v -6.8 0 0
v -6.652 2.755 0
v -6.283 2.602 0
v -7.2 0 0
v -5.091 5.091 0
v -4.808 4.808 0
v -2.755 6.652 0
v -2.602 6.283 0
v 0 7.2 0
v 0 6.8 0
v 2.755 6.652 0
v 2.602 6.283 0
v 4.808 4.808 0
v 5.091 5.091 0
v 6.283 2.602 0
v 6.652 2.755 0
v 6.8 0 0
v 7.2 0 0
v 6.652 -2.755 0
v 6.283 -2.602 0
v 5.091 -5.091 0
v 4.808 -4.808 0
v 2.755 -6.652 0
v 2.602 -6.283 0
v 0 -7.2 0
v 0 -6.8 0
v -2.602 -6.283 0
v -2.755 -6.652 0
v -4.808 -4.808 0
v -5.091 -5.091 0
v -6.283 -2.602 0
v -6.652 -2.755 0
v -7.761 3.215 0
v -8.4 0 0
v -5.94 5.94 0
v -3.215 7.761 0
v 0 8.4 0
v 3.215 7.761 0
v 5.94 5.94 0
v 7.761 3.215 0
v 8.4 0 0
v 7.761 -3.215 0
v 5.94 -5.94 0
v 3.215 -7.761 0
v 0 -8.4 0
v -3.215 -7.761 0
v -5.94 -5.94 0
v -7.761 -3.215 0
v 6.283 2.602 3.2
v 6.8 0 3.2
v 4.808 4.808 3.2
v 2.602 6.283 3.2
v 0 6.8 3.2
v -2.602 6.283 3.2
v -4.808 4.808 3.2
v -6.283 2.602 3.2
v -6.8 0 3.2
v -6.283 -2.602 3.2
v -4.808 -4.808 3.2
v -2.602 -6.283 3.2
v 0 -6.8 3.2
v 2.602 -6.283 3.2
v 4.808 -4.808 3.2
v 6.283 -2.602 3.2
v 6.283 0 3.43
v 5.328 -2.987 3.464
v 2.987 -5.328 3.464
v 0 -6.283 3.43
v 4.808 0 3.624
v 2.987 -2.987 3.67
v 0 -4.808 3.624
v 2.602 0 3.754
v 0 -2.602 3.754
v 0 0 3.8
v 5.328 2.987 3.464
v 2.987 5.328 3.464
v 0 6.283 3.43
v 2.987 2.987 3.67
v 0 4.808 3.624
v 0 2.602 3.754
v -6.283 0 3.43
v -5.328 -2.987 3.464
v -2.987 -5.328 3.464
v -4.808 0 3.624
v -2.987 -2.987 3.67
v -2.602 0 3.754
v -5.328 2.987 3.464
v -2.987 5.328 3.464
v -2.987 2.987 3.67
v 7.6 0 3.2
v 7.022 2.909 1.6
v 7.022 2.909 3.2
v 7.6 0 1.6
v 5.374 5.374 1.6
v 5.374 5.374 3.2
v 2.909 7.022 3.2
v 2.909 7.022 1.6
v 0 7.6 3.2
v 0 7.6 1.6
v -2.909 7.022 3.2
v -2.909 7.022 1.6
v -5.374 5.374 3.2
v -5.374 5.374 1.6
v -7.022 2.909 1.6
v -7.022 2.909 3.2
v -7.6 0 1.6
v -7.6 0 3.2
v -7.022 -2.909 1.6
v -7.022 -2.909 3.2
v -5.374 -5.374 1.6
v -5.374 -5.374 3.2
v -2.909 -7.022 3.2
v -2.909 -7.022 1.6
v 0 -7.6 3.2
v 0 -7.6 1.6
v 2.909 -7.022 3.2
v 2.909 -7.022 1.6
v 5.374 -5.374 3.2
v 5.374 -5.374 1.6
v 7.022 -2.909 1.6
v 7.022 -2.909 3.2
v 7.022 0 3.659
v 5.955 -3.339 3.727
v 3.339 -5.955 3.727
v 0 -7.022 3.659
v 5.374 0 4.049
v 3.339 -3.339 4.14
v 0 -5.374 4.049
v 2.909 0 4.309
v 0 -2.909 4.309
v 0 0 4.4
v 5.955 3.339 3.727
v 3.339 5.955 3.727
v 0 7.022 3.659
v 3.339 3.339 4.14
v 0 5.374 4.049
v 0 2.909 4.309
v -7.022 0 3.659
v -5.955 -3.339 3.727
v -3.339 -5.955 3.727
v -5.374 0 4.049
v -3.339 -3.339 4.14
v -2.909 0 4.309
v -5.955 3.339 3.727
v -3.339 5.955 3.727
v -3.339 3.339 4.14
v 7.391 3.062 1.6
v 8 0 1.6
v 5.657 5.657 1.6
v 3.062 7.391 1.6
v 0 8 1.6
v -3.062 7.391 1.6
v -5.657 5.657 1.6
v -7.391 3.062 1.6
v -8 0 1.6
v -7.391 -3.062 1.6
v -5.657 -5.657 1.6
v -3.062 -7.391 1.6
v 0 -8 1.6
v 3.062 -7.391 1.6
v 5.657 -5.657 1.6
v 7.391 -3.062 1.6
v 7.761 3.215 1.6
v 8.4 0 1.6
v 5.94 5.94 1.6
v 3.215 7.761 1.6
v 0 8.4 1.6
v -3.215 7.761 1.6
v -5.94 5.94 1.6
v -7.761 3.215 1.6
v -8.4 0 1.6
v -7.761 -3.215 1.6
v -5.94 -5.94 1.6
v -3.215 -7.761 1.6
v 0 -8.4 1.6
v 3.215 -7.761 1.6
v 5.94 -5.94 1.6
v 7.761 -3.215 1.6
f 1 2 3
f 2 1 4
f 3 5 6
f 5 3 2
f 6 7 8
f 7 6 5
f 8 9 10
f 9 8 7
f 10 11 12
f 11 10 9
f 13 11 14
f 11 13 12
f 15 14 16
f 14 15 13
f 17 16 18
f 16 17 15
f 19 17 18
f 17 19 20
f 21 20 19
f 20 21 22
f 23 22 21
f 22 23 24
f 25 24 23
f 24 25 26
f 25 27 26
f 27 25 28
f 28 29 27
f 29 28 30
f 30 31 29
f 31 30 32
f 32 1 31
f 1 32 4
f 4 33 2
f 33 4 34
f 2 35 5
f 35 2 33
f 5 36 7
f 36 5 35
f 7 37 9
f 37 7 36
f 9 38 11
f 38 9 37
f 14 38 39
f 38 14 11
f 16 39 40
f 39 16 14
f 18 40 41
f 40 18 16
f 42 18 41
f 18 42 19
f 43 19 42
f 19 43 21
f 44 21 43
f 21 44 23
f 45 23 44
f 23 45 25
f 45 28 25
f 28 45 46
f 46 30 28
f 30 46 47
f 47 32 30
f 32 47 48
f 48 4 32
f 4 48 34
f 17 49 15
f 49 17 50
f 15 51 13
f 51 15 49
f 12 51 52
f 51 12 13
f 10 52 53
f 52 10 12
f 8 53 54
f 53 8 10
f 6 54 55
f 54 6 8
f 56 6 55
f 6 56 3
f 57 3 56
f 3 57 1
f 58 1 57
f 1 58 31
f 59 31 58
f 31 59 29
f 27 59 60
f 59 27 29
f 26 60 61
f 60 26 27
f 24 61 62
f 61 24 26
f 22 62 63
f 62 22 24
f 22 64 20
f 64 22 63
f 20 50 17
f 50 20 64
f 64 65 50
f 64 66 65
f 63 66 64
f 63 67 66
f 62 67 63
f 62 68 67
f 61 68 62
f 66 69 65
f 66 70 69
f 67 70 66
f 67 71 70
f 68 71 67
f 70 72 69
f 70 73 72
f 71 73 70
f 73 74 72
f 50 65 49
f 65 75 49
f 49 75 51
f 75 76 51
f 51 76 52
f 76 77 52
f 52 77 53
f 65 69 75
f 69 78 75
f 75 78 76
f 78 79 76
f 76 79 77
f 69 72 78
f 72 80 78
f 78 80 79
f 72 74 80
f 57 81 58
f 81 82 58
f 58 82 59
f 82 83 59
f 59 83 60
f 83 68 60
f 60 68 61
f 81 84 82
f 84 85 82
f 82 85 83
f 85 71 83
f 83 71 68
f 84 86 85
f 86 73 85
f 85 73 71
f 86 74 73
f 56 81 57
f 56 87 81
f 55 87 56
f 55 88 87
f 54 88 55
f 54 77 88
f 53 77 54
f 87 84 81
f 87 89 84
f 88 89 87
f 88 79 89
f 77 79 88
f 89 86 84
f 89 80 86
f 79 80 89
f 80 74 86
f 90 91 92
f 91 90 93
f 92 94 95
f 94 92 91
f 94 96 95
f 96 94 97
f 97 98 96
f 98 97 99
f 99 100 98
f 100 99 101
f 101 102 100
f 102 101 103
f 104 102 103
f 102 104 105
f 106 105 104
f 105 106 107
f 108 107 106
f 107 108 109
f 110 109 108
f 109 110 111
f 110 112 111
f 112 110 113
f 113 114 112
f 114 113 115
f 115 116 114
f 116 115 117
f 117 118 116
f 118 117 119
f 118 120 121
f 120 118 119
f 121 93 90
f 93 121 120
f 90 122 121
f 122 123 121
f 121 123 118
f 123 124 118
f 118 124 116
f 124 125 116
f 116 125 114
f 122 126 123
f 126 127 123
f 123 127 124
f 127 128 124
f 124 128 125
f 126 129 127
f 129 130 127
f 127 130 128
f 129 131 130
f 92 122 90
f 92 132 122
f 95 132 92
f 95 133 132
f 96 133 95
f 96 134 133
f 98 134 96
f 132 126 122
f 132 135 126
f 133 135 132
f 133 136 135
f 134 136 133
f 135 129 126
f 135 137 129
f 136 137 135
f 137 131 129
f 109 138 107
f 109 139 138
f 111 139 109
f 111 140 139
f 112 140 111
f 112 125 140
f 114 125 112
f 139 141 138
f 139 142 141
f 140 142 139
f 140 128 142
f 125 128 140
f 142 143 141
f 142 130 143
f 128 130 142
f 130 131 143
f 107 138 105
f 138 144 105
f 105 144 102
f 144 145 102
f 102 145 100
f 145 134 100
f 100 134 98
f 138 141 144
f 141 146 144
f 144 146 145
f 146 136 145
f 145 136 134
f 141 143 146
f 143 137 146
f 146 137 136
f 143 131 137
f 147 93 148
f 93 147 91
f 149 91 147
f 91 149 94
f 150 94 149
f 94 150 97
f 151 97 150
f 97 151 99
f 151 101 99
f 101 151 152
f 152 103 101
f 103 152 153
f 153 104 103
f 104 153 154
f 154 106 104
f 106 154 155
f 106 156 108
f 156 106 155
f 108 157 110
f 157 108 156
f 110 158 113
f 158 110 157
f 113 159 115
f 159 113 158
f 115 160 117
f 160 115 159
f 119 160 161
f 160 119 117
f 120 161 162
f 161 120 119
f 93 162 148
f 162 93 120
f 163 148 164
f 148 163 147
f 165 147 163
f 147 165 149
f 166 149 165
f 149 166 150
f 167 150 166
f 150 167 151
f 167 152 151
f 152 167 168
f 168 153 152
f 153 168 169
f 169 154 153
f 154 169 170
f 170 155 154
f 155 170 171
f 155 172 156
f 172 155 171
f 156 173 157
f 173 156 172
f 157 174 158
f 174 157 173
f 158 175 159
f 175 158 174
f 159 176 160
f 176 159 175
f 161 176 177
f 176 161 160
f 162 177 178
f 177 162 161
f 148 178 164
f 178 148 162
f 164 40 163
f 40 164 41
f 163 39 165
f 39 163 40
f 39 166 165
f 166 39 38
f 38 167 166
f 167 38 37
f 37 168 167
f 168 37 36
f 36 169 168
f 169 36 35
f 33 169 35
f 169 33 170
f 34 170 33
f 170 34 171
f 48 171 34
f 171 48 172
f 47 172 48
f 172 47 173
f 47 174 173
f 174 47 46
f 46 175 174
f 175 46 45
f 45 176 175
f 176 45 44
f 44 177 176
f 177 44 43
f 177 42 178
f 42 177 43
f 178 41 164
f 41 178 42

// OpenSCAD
// file: ../p/1-8sphe.scad
use <../lib.scad>
function ldraw_lib__1_8sphe() = [
// 0 Sphere 0.125
// 0 Name: 1-8sphe.dat
// 0 Author: James Jessiman
// 0 !LDRAW_ORG Primitive UPDATE 2012-03
// 0 !LICENSE Licensed under CC BY 2.0 and CC BY 4.0 : see CAreadme.txt
// 
// 0 BFC CERTIFY CCW
  [0,"BFC","CERTIFY"],
  [0,"BFC","CCW"],
// 
// 0 !HISTORY 2000-08-01 {Axel Poque} fixes to resolve L3P error messages.
// 0 !HISTORY 2000-08-01 {Manfred Moolhuysen} fixes to resolve L3P error messages.
// 0 !HISTORY 2000-09-30 [PTadmin] Official Update 2000-02
// 0 !HISTORY 2002-03-28 [hafhead] Made BFC compliant
// 0 !HISTORY 2002-04-25 [PTadmin] Official Update 2002-02
// 0 !HISTORY 2007-06-22 [PTadmin] Header formatted for Contributor Agreement
// 0 !HISTORY 2008-07-01 [PTadmin] Official Update 2008-01
// 0 !HISTORY 2010-09-12 [MagFors] Changed winding, removed duplicated cond-line, optimized filesize
// 0 !HISTORY 2010-12-31 [PTadmin] Official Update 2010-03
// 0 !HISTORY 2012-07-01 [tcobbs] Replaced with geometry from LDView
// 0 !HISTORY 2012-12-28 [PTadmin] Official Update 2012-03
// 
// 
// 3 16 1 0 0 0.9239 0.3827 0 0.9239 0 0.3827
  [3,16,1,0,0,0.9239,0.3827,0,0.9239,0,0.3827],
// 3 16 0.9239 0.3827 0 0.7836 0.4393 0.4393 0.9239 0 0.3827
  [3,16,0.9239,0.3827,0,0.7836,0.4393,0.4393,0.9239,0,0.3827],
// 3 16 0.9239 0 0.3827 0.7836 0.4393 0.4393 0.7071 0 0.7071
  [3,16,0.9239,0,0.3827,0.7836,0.4393,0.4393,0.7071,0,0.7071],
// 3 16 0.7836 0.4393 0.4393 0.4393 0.4393 0.7836 0.7071 0 0.7071
  [3,16,0.7836,0.4393,0.4393,0.4393,0.4393,0.7836,0.7071,0,0.7071],
// 3 16 0.7071 0 0.7071 0.4393 0.4393 0.7836 0.3827 0 0.9239
  [3,16,0.7071,0,0.7071,0.4393,0.4393,0.7836,0.3827,0,0.9239],
// 3 16 0.4393 0.4393 0.7836 0 0.3827 0.9239 0.3827 0 0.9239
  [3,16,0.4393,0.4393,0.7836,0,0.3827,0.9239,0.3827,0,0.9239],
// 3 16 0.3827 0 0.9239 0 0.3827 0.9239 0 0 1
  [3,16,0.3827,0,0.9239,0,0.3827,0.9239,0,0,1],
// 3 16 0.9239 0.3827 0 0.7071 0.7071 0 0.7836 0.4393 0.4393
  [3,16,0.9239,0.3827,0,0.7071,0.7071,0,0.7836,0.4393,0.4393],
// 3 16 0.7071 0.7071 0 0.4393 0.7836 0.4393 0.7836 0.4393 0.4393
  [3,16,0.7071,0.7071,0,0.4393,0.7836,0.4393,0.7836,0.4393,0.4393],
// 3 16 0.7836 0.4393 0.4393 0.4393 0.7836 0.4393 0.4393 0.4393 0.7836
  [3,16,0.7836,0.4393,0.4393,0.4393,0.7836,0.4393,0.4393,0.4393,0.7836],
// 3 16 0.4393 0.7836 0.4393 0 0.7071 0.7071 0.4393 0.4393 0.7836
  [3,16,0.4393,0.7836,0.4393,0,0.7071,0.7071,0.4393,0.4393,0.7836],
// 3 16 0.4393 0.4393 0.7836 0 0.7071 0.7071 0 0.3827 0.9239
  [3,16,0.4393,0.4393,0.7836,0,0.7071,0.7071,0,0.3827,0.9239],
// 3 16 0.7071 0.7071 0 0.3827 0.9239 0 0.4393 0.7836 0.4393
  [3,16,0.7071,0.7071,0,0.3827,0.9239,0,0.4393,0.7836,0.4393],
// 3 16 0.3827 0.9239 0 0 0.9239 0.3827 0.4393 0.7836 0.4393
  [3,16,0.3827,0.9239,0,0,0.9239,0.3827,0.4393,0.7836,0.4393],
// 3 16 0.4393 0.7836 0.4393 0 0.9239 0.3827 0 0.7071 0.7071
  [3,16,0.4393,0.7836,0.4393,0,0.9239,0.3827,0,0.7071,0.7071],
// 3 16 0.3827 0.9239 0 0 1 0 0 0.9239 0.3827
  [3,16,0.3827,0.9239,0,0,1,0,0,0.9239,0.3827],
// 
// 5 24 1 0 0 0.9239 0.3827 0 1 0 -0.1 0.9239 0 0.3827
  [5,24,1,0,0,0.9239,0.3827,0,1,0,-0.1,0.9239,0,0.3827],
// 5 24 0.9239 0.3827 0 0.9239 0 0.3827 1 0 0 0.7836 0.4393 0.4393
  [5,24,0.9239,0.3827,0,0.9239,0,0.3827,1,0,0,0.7836,0.4393,0.4393],
// 5 24 1 0 0 0.9239 0 0.3827 0.9239 0.3827 0 1 -0.1 0
  [5,24,1,0,0,0.9239,0,0.3827,0.9239,0.3827,0,1,-0.1,0],
// 5 24 0.9239 0 0.3827 0.7836 0.4393 0.4393 0.9239 0.3827 0 0.7071 0 0.7071
  [5,24,0.9239,0,0.3827,0.7836,0.4393,0.4393,0.9239,0.3827,0,0.7071,0,0.7071],
// 5 24 0.7836 0.4393 0.4393 0.7071 0 0.7071 0.9239 0 0.3827 0.4393 0.4393 0.7836
  [5,24,0.7836,0.4393,0.4393,0.7071,0,0.7071,0.9239,0,0.3827,0.4393,0.4393,0.7836],
// 5 24 0.9239 0 0.3827 0.7071 0 0.7071 0.7836 0.4393 0.4393 0.9239 -0.1 0.3827
  [5,24,0.9239,0,0.3827,0.7071,0,0.7071,0.7836,0.4393,0.4393,0.9239,-0.1,0.3827],
// 5 24 0.7071 0 0.7071 0.4393 0.4393 0.7836 0.7836 0.4393 0.4393 0.3827 0 0.9239
  [5,24,0.7071,0,0.7071,0.4393,0.4393,0.7836,0.7836,0.4393,0.4393,0.3827,0,0.9239],
// 5 24 0.4393 0.4393 0.7836 0.3827 0 0.9239 0.7071 0 0.7071 0 0.3827 0.9239
  [5,24,0.4393,0.4393,0.7836,0.3827,0,0.9239,0.7071,0,0.7071,0,0.3827,0.9239],
// 5 24 0.7071 0 0.7071 0.3827 0 0.9239 0.4393 0.4393 0.7836 0.7071 -0.1 0.7071
  [5,24,0.7071,0,0.7071,0.3827,0,0.9239,0.4393,0.4393,0.7836,0.7071,-0.1,0.7071],
// 5 24 0.3827 0 0.9239 0 0.3827 0.9239 0.4393 0.4393 0.7836 0 0 1
  [5,24,0.3827,0,0.9239,0,0.3827,0.9239,0.4393,0.4393,0.7836,0,0,1],
// 5 24 0 0.3827 0.9239 0 0 1 0.3827 0 0.9239 -0.1 0.3827 0.9239
  [5,24,0,0.3827,0.9239,0,0,1,0.3827,0,0.9239,-0.1,0.3827,0.9239],
// 5 24 0.3827 0 0.9239 0 0 1 0 0.3827 0.9239 0.3827 -0.1 0.9239
  [5,24,0.3827,0,0.9239,0,0,1,0,0.3827,0.9239,0.3827,-0.1,0.9239],
// 5 24 0.9239 0.3827 0 0.7071 0.7071 0 0.9239 0.3827 -0.1 0.7836 0.4393 0.4393
  [5,24,0.9239,0.3827,0,0.7071,0.7071,0,0.9239,0.3827,-0.1,0.7836,0.4393,0.4393],
// 5 24 0.7071 0.7071 0 0.7836 0.4393 0.4393 0.9239 0.3827 0 0.4393 0.7836 0.4393
  [5,24,0.7071,0.7071,0,0.7836,0.4393,0.4393,0.9239,0.3827,0,0.4393,0.7836,0.4393],
// 5 24 0.9239 0.3827 0 0.7836 0.4393 0.4393 0.7071 0.7071 0 0.9239 0 0.3827
  [5,24,0.9239,0.3827,0,0.7836,0.4393,0.4393,0.7071,0.7071,0,0.9239,0,0.3827],
// 5 24 0.7836 0.4393 0.4393 0.4393 0.7836 0.4393 0.7071 0.7071 0 0.4393 0.4393 0.7836
  [5,24,0.7836,0.4393,0.4393,0.4393,0.7836,0.4393,0.7071,0.7071,0,0.4393,0.4393,0.7836],
// 5 24 0.4393 0.7836 0.4393 0.4393 0.4393 0.7836 0.7836 0.4393 0.4393 0 0.7071 0.7071
  [5,24,0.4393,0.7836,0.4393,0.4393,0.4393,0.7836,0.7836,0.4393,0.4393,0,0.7071,0.7071],
// 5 24 0.7836 0.4393 0.4393 0.4393 0.4393 0.7836 0.4393 0.7836 0.4393 0.7071 0 0.7071
  [5,24,0.7836,0.4393,0.4393,0.4393,0.4393,0.7836,0.4393,0.7836,0.4393,0.7071,0,0.7071],
// 5 24 0.4393 0.4393 0.7836 0 0.7071 0.7071 0.4393 0.7836 0.4393 0 0.3827 0.9239
  [5,24,0.4393,0.4393,0.7836,0,0.7071,0.7071,0.4393,0.7836,0.4393,0,0.3827,0.9239],
// 5 24 0 0.7071 0.7071 0 0.3827 0.9239 0.4393 0.4393 0.7836 -0.1 0.7071 0.7071
  [5,24,0,0.7071,0.7071,0,0.3827,0.9239,0.4393,0.4393,0.7836,-0.1,0.7071,0.7071],
// 5 24 0.4393 0.4393 0.7836 0 0.3827 0.9239 0 0.7071 0.7071 0.3827 0 0.9239
  [5,24,0.4393,0.4393,0.7836,0,0.3827,0.9239,0,0.7071,0.7071,0.3827,0,0.9239],
// 5 24 0.7071 0.7071 0 0.3827 0.9239 0 0.7071 0.7071 -0.1 0.4393 0.7836 0.4393
  [5,24,0.7071,0.7071,0,0.3827,0.9239,0,0.7071,0.7071,-0.1,0.4393,0.7836,0.4393],
// 5 24 0.3827 0.9239 0 0.4393 0.7836 0.4393 0.7071 0.7071 0 0 0.9239 0.3827
  [5,24,0.3827,0.9239,0,0.4393,0.7836,0.4393,0.7071,0.7071,0,0,0.9239,0.3827],
// 5 24 0.7071 0.7071 0 0.4393 0.7836 0.4393 0.3827 0.9239 0 0.7836 0.4393 0.4393
  [5,24,0.7071,0.7071,0,0.4393,0.7836,0.4393,0.3827,0.9239,0,0.7836,0.4393,0.4393],
// 5 24 0.4393 0.7836 0.4393 0 0.9239 0.3827 0.3827 0.9239 0 0 0.7071 0.7071
  [5,24,0.4393,0.7836,0.4393,0,0.9239,0.3827,0.3827,0.9239,0,0,0.7071,0.7071],
// 5 24 0 0.9239 0.3827 0 0.7071 0.7071 0.4393 0.7836 0.4393 -0.1 0.9239 0.3827
  [5,24,0,0.9239,0.3827,0,0.7071,0.7071,0.4393,0.7836,0.4393,-0.1,0.9239,0.3827],
// 5 24 0.4393 0.7836 0.4393 0 0.7071 0.7071 0 0.9239 0.3827 0.4393 0.4393 0.7836
  [5,24,0.4393,0.7836,0.4393,0,0.7071,0.7071,0,0.9239,0.3827,0.4393,0.4393,0.7836],
// 5 24 0.3827 0.9239 0 0 1 0 0.3827 0.9239 -0.1 0 0.9239 0.3827
  [5,24,0.3827,0.9239,0,0,1,0,0.3827,0.9239,-0.1,0,0.9239,0.3827],
// 5 24 0 1 0 0 0.9239 0.3827 0.3827 0.9239 0 -0.1 1 0
  [5,24,0,1,0,0,0.9239,0.3827,0.3827,0.9239,0,-0.1,1,0],
// 5 24 0.3827 0.9239 0 0 0.9239 0.3827 0 1 0 0.4393 0.7836 0.4393
  [5,24,0.3827,0.9239,0,0,0.9239,0.3827,0,1,0,0.4393,0.7836,0.4393],
];
module ldraw_lib__1_8sphe(step=0, col=false, unit=2/5, alt=false, line=0.2, solid=!$preview)
    makepoly(ldraw_lib__1_8sphe(), step=step, col=col, unit=unit, alt=alt, line=line, solid=solid);
ldraw_lib__1_8sphe(line=0.2);
// file: ../p/4-8sphe.scad
use <../lib.scad>
use <1-8sphe.scad>
function ldraw_lib__4_8sphe() = [
// 0 Sphere 0.5
// 0 Name: 4-8sphe.dat
// 0 Author: James Jessiman
// 0 !LDRAW_ORG Primitive UPDATE 2003-02
// 0 !LICENSE Licensed under CC BY 2.0 and CC BY 4.0 : see CAreadme.txt
// 
// 0 BFC CERTIFY CCW
  [0,"BFC","CERTIFY"],
  [0,"BFC","CCW"],
// 
// 0 !HISTORY 2002-08-31 [izanette] Modified with WINDZ for BFC compliance
// 0 !HISTORY 2003-08-01 [PTadmin] Official Update 2003-02
// 0 !HISTORY 2007-06-24 [PTadmin] Header formatted for Contributor Agreement
// 0 !HISTORY 2008-07-01 [PTadmin] Official Update 2008-01
// 
// 
// 1 16 0 0 0 1 0 0 0 1 0 0 0 1 1-8sphe.dat
  [1,16,0,0,0,1,0,0,0,1,0,0,0,1, ldraw_lib__1_8sphe()],
// 1 16 0 0 0 1 0 0 0 1 0 0 0 -1 1-8sphe.dat
  [1,16,0,0,0,1,0,0,0,1,0,0,0,-1, ldraw_lib__1_8sphe()],
// 1 16 0 0 0 -1 0 0 0 1 0 0 0 1 1-8sphe.dat
  [1,16,0,0,0,-1,0,0,0,1,0,0,0,1, ldraw_lib__1_8sphe()],
// 1 16 0 0 0 -1 0 0 0 1 0 0 0 -1 1-8sphe.dat
  [1,16,0,0,0,-1,0,0,0,1,0,0,0,-1, ldraw_lib__1_8sphe()],
// 0
// 
];
module ldraw_lib__4_8sphe(step=0, col=false, unit=2/5, alt=false, line=0.2, solid=!$preview)
    makepoly(ldraw_lib__4_8sphe(), step=step, col=col, unit=unit, alt=alt, line=line, solid=solid);
ldraw_lib__4_8sphe(line=0.2);
// file: ../p/4-4ring6.scad
use <../lib.scad>
function ldraw_lib__4_4ring6() = [
// 0 Ring  6 x 1.0
// 0 Name: 4-4ring6.dat
// 0 Author: Mark Kennedy [mkennedy]
// 0 !LDRAW_ORG Primitive UPDATE 2012-01
// 0 !LICENSE Licensed under CC BY 4.0 : see CAreadme.txt
// 
// 0 BFC CERTIFY CCW
  [0,"BFC","CERTIFY"],
  [0,"BFC","CCW"],
// 
// 0 !HISTORY 2001-10-23 [pneaster] resequenced quads, corrected winding.
// 0 !HISTORY 2001-11-30 [PTadmin] Official Update 2001-02
// 0 !HISTORY 2007-06-24 [PTadmin] Header formatted for Contributor Agreement
// 0 !HISTORY 2008-07-01 [PTadmin] Official Update 2008-01
// 0 !HISTORY 2012-02-16 [Philo] Changed to CCW
// 0 !HISTORY 2012-03-30 [PTadmin] Official Update 2012-01
// 
// 
// 4 16 7 0 0 6.4672 0 2.6788 5.5433 0 2.2961 6 0 0
  [4,16,7,0,0,6.4672,0,2.6788,5.5433,0,2.2961,6,0,0],
// 4 16 6.4672 0 2.6788 4.9497 0 4.9497 4.2426 0 4.2426 5.5433 0 2.2961
  [4,16,6.4672,0,2.6788,4.9497,0,4.9497,4.2426,0,4.2426,5.5433,0,2.2961],
// 4 16 4.9497 0 4.9497 2.6788 0 6.4672 2.2961 0 5.5433 4.2426 0 4.2426
  [4,16,4.9497,0,4.9497,2.6788,0,6.4672,2.2961,0,5.5433,4.2426,0,4.2426],
// 4 16 2.6788 0 6.4672 0 0 7 0 0 6 2.2961 0 5.5433
  [4,16,2.6788,0,6.4672,0,0,7,0,0,6,2.2961,0,5.5433],
// 4 16 0 0 7 -2.6788 0 6.4672 -2.2961 0 5.5433 0 0 6
  [4,16,0,0,7,-2.6788,0,6.4672,-2.2961,0,5.5433,0,0,6],
// 4 16 -2.6788 0 6.4672 -4.9497 0 4.9497 -4.2426 0 4.2426 -2.2961 0 5.5433
  [4,16,-2.6788,0,6.4672,-4.9497,0,4.9497,-4.2426,0,4.2426,-2.2961,0,5.5433],
// 4 16 -4.9497 0 4.9497 -6.4672 0 2.6788 -5.5433 0 2.2961 -4.2426 0 4.2426
  [4,16,-4.9497,0,4.9497,-6.4672,0,2.6788,-5.5433,0,2.2961,-4.2426,0,4.2426],
// 4 16 -6.4672 0 2.6788 -7 0 0 -6 0 0 -5.5433 0 2.2961
  [4,16,-6.4672,0,2.6788,-7,0,0,-6,0,0,-5.5433,0,2.2961],
// 4 16 -7 0 0 -6.4672 0 -2.6788 -5.5433 0 -2.2961 -6 0 0
  [4,16,-7,0,0,-6.4672,0,-2.6788,-5.5433,0,-2.2961,-6,0,0],
// 4 16 -6.4672 0 -2.6788 -4.9497 0 -4.9497 -4.2426 0 -4.2426 -5.5433 0 -2.2961
  [4,16,-6.4672,0,-2.6788,-4.9497,0,-4.9497,-4.2426,0,-4.2426,-5.5433,0,-2.2961],
// 4 16 -4.9497 0 -4.9497 -2.6788 0 -6.4672 -2.2961 0 -5.5433 -4.2426 0 -4.2426
  [4,16,-4.9497,0,-4.9497,-2.6788,0,-6.4672,-2.2961,0,-5.5433,-4.2426,0,-4.2426],
// 4 16 -2.6788 0 -6.4672 0 0 -7 0 0 -6 -2.2961 0 -5.5433
  [4,16,-2.6788,0,-6.4672,0,0,-7,0,0,-6,-2.2961,0,-5.5433],
// 4 16 0 0 -7 2.6788 0 -6.4672 2.2961 0 -5.5433 0 0 -6
  [4,16,0,0,-7,2.6788,0,-6.4672,2.2961,0,-5.5433,0,0,-6],
// 4 16 2.6788 0 -6.4672 4.9497 0 -4.9497 4.2426 0 -4.2426 2.2961 0 -5.5433
  [4,16,2.6788,0,-6.4672,4.9497,0,-4.9497,4.2426,0,-4.2426,2.2961,0,-5.5433],
// 4 16 4.9497 0 -4.9497 6.4672 0 -2.6788 5.5433 0 -2.2961 4.2426 0 -4.2426
  [4,16,4.9497,0,-4.9497,6.4672,0,-2.6788,5.5433,0,-2.2961,4.2426,0,-4.2426],
// 4 16 6.4672 0 -2.6788 7 0 0 6 0 0 5.5433 0 -2.2961
  [4,16,6.4672,0,-2.6788,7,0,0,6,0,0,5.5433,0,-2.2961],
];
module ldraw_lib__4_4ring6(step=0, col=false, unit=2/5, alt=false, line=0.2, solid=!$preview)
    makepoly(ldraw_lib__4_4ring6(), step=step, col=col, unit=unit, alt=alt, line=line, solid=solid);
ldraw_lib__4_4ring6(line=0.2);
// file: ../p/4-4rin20.scad
use <../lib.scad>
function ldraw_lib__4_4rin20() = [
// 0 Ring 20 x 1.0
// 0 Name: 4-4rin20.dat
// 0 Author: Guy Vivan [guyvivan]
// 0 !LDRAW_ORG Primitive UPDATE 2009-01
// 0 !LICENSE Licensed under CC BY 2.0 and CC BY 4.0 : see CAreadme.txt
// 
// 0 BFC CERTIFY CCW
  [0,"BFC","CERTIFY"],
  [0,"BFC","CCW"],
// 
// 0 !HISTORY 2009-05-02 [PTadmin] Official Update 2009-01
// 
// 
// 4 16 20 0 0 21 0 0 19.4019 0 8.0367 18.478 0 7.654
  [4,16,20,0,0,21,0,0,19.4019,0,8.0367,18.478,0,7.654],
// 4 16 18.478 0 7.654 19.4019 0 8.0367 14.8491 0 14.8491 14.142 0 14.142
  [4,16,18.478,0,7.654,19.4019,0,8.0367,14.8491,0,14.8491,14.142,0,14.142],
// 4 16 14.142 0 14.142 14.8491 0 14.8491 8.0367 0 19.4019 7.654 0 18.478
  [4,16,14.142,0,14.142,14.8491,0,14.8491,8.0367,0,19.4019,7.654,0,18.478],
// 4 16 7.654 0 18.478 8.0367 0 19.4019 0 0 21 0 0 20
  [4,16,7.654,0,18.478,8.0367,0,19.4019,0,0,21,0,0,20],
// 4 16 0 0 20 0 0 21 -8.0367 0 19.4019 -7.654 0 18.478
  [4,16,0,0,20,0,0,21,-8.0367,0,19.4019,-7.654,0,18.478],
// 4 16 -7.654 0 18.478 -8.0367 0 19.4019 -14.8491 0 14.8491 -14.142 0 14.142
  [4,16,-7.654,0,18.478,-8.0367,0,19.4019,-14.8491,0,14.8491,-14.142,0,14.142],
// 4 16 -14.142 0 14.142 -14.8491 0 14.8491 -19.4019 0 8.0367 -18.478 0 7.654
  [4,16,-14.142,0,14.142,-14.8491,0,14.8491,-19.4019,0,8.0367,-18.478,0,7.654],
// 4 16 -18.478 0 7.654 -19.4019 0 8.0367 -21 0 0 -20 0 0
  [4,16,-18.478,0,7.654,-19.4019,0,8.0367,-21,0,0,-20,0,0],
// 4 16 -20 0 0 -21 0 0 -19.4019 0 -8.0367 -18.478 0 -7.654
  [4,16,-20,0,0,-21,0,0,-19.4019,0,-8.0367,-18.478,0,-7.654],
// 4 16 -18.478 0 -7.654 -19.4019 0 -8.0367 -14.8491 0 -14.8491 -14.142 0 -14.142
  [4,16,-18.478,0,-7.654,-19.4019,0,-8.0367,-14.8491,0,-14.8491,-14.142,0,-14.142],
// 4 16 -14.142 0 -14.142 -14.8491 0 -14.8491 -8.0367 0 -19.4019 -7.654 0 -18.478
  [4,16,-14.142,0,-14.142,-14.8491,0,-14.8491,-8.0367,0,-19.4019,-7.654,0,-18.478],
// 4 16 -7.654 0 -18.478 -8.0367 0 -19.4019 0 0 -21 0 0 -20
  [4,16,-7.654,0,-18.478,-8.0367,0,-19.4019,0,0,-21,0,0,-20],
// 4 16 0 0 -20 0 0 -21 8.0367 0 -19.4019 7.654 0 -18.478
  [4,16,0,0,-20,0,0,-21,8.0367,0,-19.4019,7.654,0,-18.478],
// 4 16 7.654 0 -18.478 8.0367 0 -19.4019 14.8491 0 -14.8491 14.142 0 -14.142
  [4,16,7.654,0,-18.478,8.0367,0,-19.4019,14.8491,0,-14.8491,14.142,0,-14.142],
// 4 16 14.142 0 -14.142 14.8491 0 -14.8491 19.4019 0 -8.0367 18.478 0 -7.654
  [4,16,14.142,0,-14.142,14.8491,0,-14.8491,19.4019,0,-8.0367,18.478,0,-7.654],
// 4 16 18.478 0 -7.654 19.4019 0 -8.0367 21 0 0 20 0 0
  [4,16,18.478,0,-7.654,19.4019,0,-8.0367,21,0,0,20,0,0],
// 
// 0 end of file
// 
];
module ldraw_lib__4_4rin20(step=0, col=false, unit=2/5, alt=false, line=0.2, solid=!$preview)
    makepoly(ldraw_lib__4_4rin20(), step=step, col=col, unit=unit, alt=alt, line=line, solid=solid);
ldraw_lib__4_4rin20(line=0.2);
// file: ../p/4-4rin19.scad
use <../lib.scad>
function ldraw_lib__4_4rin19() = [
// 0 Ring 19 x 1.0
// 0 Name: 4-4rin19.dat
// 0 Author: Guy Vivan [guyvivan]
// 0 !LDRAW_ORG Primitive UPDATE 2010-01
// 0 !LICENSE Licensed under CC BY 2.0 and CC BY 4.0 : see CAreadme.txt
// 
// 0 BFC CERTIFY CCW
  [0,"BFC","CERTIFY"],
  [0,"BFC","CCW"],
// 
// 0 !HISTORY 2010-04-05 [PTadmin] Official Update 2010-01
// 
// 
// 4 16 19 0 0 20 0 0 18.478 0 7.654 17.5541 0 7.2713
  [4,16,19,0,0,20,0,0,18.478,0,7.654,17.5541,0,7.2713],
// 4 16 17.5541 0 7.2713 18.478 0 7.654 14.142 0 14.142 13.4349 0 13.4349
  [4,16,17.5541,0,7.2713,18.478,0,7.654,14.142,0,14.142,13.4349,0,13.4349],
// 4 16 13.4349 0 13.4349 14.142 0 14.142 7.654 0 18.478 7.2713 0 17.5541
  [4,16,13.4349,0,13.4349,14.142,0,14.142,7.654,0,18.478,7.2713,0,17.5541],
// 4 16 7.2713 0 17.5541 7.654 0 18.478 0 0 20 0 0 19
  [4,16,7.2713,0,17.5541,7.654,0,18.478,0,0,20,0,0,19],
// 4 16 0 0 19 0 0 20 -7.654 0 18.478 -7.2713 0 17.5541
  [4,16,0,0,19,0,0,20,-7.654,0,18.478,-7.2713,0,17.5541],
// 4 16 -7.2713 0 17.5541 -7.654 0 18.478 -14.142 0 14.142 -13.4349 0 13.4349
  [4,16,-7.2713,0,17.5541,-7.654,0,18.478,-14.142,0,14.142,-13.4349,0,13.4349],
// 4 16 -13.4349 0 13.4349 -14.142 0 14.142 -18.478 0 7.654 -17.5541 0 7.2713
  [4,16,-13.4349,0,13.4349,-14.142,0,14.142,-18.478,0,7.654,-17.5541,0,7.2713],
// 4 16 -17.5541 0 7.2713 -18.478 0 7.654 -20 0 0 -19 0 0
  [4,16,-17.5541,0,7.2713,-18.478,0,7.654,-20,0,0,-19,0,0],
// 4 16 -19 0 0 -20 0 0 -18.478 0 -7.654 -17.5541 0 -7.2713
  [4,16,-19,0,0,-20,0,0,-18.478,0,-7.654,-17.5541,0,-7.2713],
// 4 16 -17.5541 0 -7.2713 -18.478 0 -7.654 -14.142 0 -14.142 -13.4349 0 -13.4349
  [4,16,-17.5541,0,-7.2713,-18.478,0,-7.654,-14.142,0,-14.142,-13.4349,0,-13.4349],
// 4 16 -13.4349 0 -13.4349 -14.142 0 -14.142 -7.654 0 -18.478 -7.2713 0 -17.5541
  [4,16,-13.4349,0,-13.4349,-14.142,0,-14.142,-7.654,0,-18.478,-7.2713,0,-17.5541],
// 4 16 -7.2713 0 -17.5541 -7.654 0 -18.478 0 0 -20 0 0 -19
  [4,16,-7.2713,0,-17.5541,-7.654,0,-18.478,0,0,-20,0,0,-19],
// 4 16 0 0 -19 0 0 -20 7.654 0 -18.478 7.2713 0 -17.5541
  [4,16,0,0,-19,0,0,-20,7.654,0,-18.478,7.2713,0,-17.5541],
// 4 16 7.2713 0 -17.5541 7.654 0 -18.478 14.142 0 -14.142 13.4349 0 -13.4349
  [4,16,7.2713,0,-17.5541,7.654,0,-18.478,14.142,0,-14.142,13.4349,0,-13.4349],
// 4 16 13.4349 0 -13.4349 14.142 0 -14.142 18.478 0 -7.654 17.5541 0 -7.2713
  [4,16,13.4349,0,-13.4349,14.142,0,-14.142,18.478,0,-7.654,17.5541,0,-7.2713],
// 4 16 17.5541 0 -7.2713 18.478 0 -7.654 20 0 0 19 0 0
  [4,16,17.5541,0,-7.2713,18.478,0,-7.654,20,0,0,19,0,0],
// 
// 0 end of file
// 
];
module ldraw_lib__4_4rin19(step=0, col=false, unit=2/5, alt=false, line=0.2, solid=!$preview)
    makepoly(ldraw_lib__4_4rin19(), step=step, col=col, unit=unit, alt=alt, line=line, solid=solid);
ldraw_lib__4_4rin19(line=0.2);
// file: ../p/4-4rin17.scad
use <../lib.scad>
function ldraw_lib__4_4rin17() = [
// 0 Ring 17 x 1.0
// 0 Name: 4-4rin17.dat
// 0 Author: Miklos Hosszu [hmick]
// 0 !LDRAW_ORG Primitive UPDATE 2012-01
// 0 !LICENSE Licensed under CC BY 2.0 and CC BY 4.0 : see CAreadme.txt
// 
// 0 BFC CERTIFY CCW
  [0,"BFC","CERTIFY"],
  [0,"BFC","CCW"],
// 
// 0 !HISTORY 2004-11-06 [PTadmin] Official Update 2004-04
// 0 !HISTORY 2007-06-24 [PTadmin] Header formatted for Contributor Agreement
// 0 !HISTORY 2008-07-01 [PTadmin] Official Update 2008-01
// 0 !HISTORY 2012-02-16 [Philo] Changed to CCW
// 0 !HISTORY 2012-03-30 [PTadmin] Official Update 2012-01
// 
// 
// 4 16 18 0 0 16.6302 0 6.8886 15.7063 0 6.5059 17 0 0
  [4,16,18,0,0,16.6302,0,6.8886,15.7063,0,6.5059,17,0,0],
// 4 16 16.6302 0 6.8886 12.7278 0 12.7278 12.0207 0 12.0207 15.7063 0 6.5059
  [4,16,16.6302,0,6.8886,12.7278,0,12.7278,12.0207,0,12.0207,15.7063,0,6.5059],
// 4 16 12.7278 0 12.7278 6.8886 0 16.6302 6.5059 0 15.7063 12.0207 0 12.0207
  [4,16,12.7278,0,12.7278,6.8886,0,16.6302,6.5059,0,15.7063,12.0207,0,12.0207],
// 4 16 6.8886 0 16.6302 0 0 18 0 0 17 6.5059 0 15.7063
  [4,16,6.8886,0,16.6302,0,0,18,0,0,17,6.5059,0,15.7063],
// 4 16 0 0 18 -6.8886 0 16.6302 -6.5059 0 15.7063 0 0 17
  [4,16,0,0,18,-6.8886,0,16.6302,-6.5059,0,15.7063,0,0,17],
// 4 16 -6.8886 0 16.6302 -12.7278 0 12.7278 -12.0207 0 12.0207 -6.5059 0 15.7063
  [4,16,-6.8886,0,16.6302,-12.7278,0,12.7278,-12.0207,0,12.0207,-6.5059,0,15.7063],
// 4 16 -12.7278 0 12.7278 -16.6302 0 6.8886 -15.7063 0 6.5059 -12.0207 0 12.0207
  [4,16,-12.7278,0,12.7278,-16.6302,0,6.8886,-15.7063,0,6.5059,-12.0207,0,12.0207],
// 4 16 -16.6302 0 6.8886 -18 0 0 -17 0 0 -15.7063 0 6.5059
  [4,16,-16.6302,0,6.8886,-18,0,0,-17,0,0,-15.7063,0,6.5059],
// 4 16 -18 0 0 -16.6302 0 -6.8886 -15.7063 0 -6.5059 -17 0 0
  [4,16,-18,0,0,-16.6302,0,-6.8886,-15.7063,0,-6.5059,-17,0,0],
// 4 16 -16.6302 0 -6.8886 -12.7278 0 -12.7278 -12.0207 0 -12.0207 -15.7063 0 -6.5059
  [4,16,-16.6302,0,-6.8886,-12.7278,0,-12.7278,-12.0207,0,-12.0207,-15.7063,0,-6.5059],
// 4 16 -12.7278 0 -12.7278 -6.8886 0 -16.6302 -6.5059 0 -15.7063 -12.0207 0 -12.0207
  [4,16,-12.7278,0,-12.7278,-6.8886,0,-16.6302,-6.5059,0,-15.7063,-12.0207,0,-12.0207],
// 4 16 -6.8886 0 -16.6302 0 0 -18 0 0 -17 -6.5059 0 -15.7063
  [4,16,-6.8886,0,-16.6302,0,0,-18,0,0,-17,-6.5059,0,-15.7063],
// 4 16 0 0 -18 6.8886 0 -16.6302 6.5059 0 -15.7063 0 0 -17
  [4,16,0,0,-18,6.8886,0,-16.6302,6.5059,0,-15.7063,0,0,-17],
// 4 16 6.8886 0 -16.6302 12.7278 0 -12.7278 12.0207 0 -12.0207 6.5059 0 -15.7063
  [4,16,6.8886,0,-16.6302,12.7278,0,-12.7278,12.0207,0,-12.0207,6.5059,0,-15.7063],
// 4 16 12.7278 0 -12.7278 16.6302 0 -6.8886 15.7063 0 -6.5059 12.0207 0 -12.0207
  [4,16,12.7278,0,-12.7278,16.6302,0,-6.8886,15.7063,0,-6.5059,12.0207,0,-12.0207],
// 4 16 16.6302 0 -6.8886 18 0 0 17 0 0 15.7063 0 -6.5059
  [4,16,16.6302,0,-6.8886,18,0,0,17,0,0,15.7063,0,-6.5059],
];
module ldraw_lib__4_4rin17(step=0, col=false, unit=2/5, alt=false, line=0.2, solid=!$preview)
    makepoly(ldraw_lib__4_4rin17(), step=step, col=col, unit=unit, alt=alt, line=line, solid=solid);
ldraw_lib__4_4rin17(line=0.2);
// file: ../p/4-4edge.scad
use <../lib.scad>
function ldraw_lib__4_4edge() = [
// 0 Circle 1.0
// 0 Name: 4-4edge.dat
// 0 Author: James Jessiman
// 0 !LDRAW_ORG Primitive UPDATE 2017-01
// 0 !LICENSE Licensed under CC BY 4.0 : see CAreadme.txt
// 
// 0 BFC CERTIFY CCW
  [0,"BFC","CERTIFY"],
  [0,"BFC","CCW"],
// 
// 0 !HISTORY 1998-12-15 [PTadmin] Official Update 1998-10
// 0 !HISTORY 2005-12-28 [PTadmin] Official Update 2005-01
// 0 !HISTORY 2007-06-24 [PTadmin] Header formatted for Contributor Agreement
// 0 !HISTORY 2008-07-01 [PTadmin] Official Update 2008-01
// 0 !HISTORY 2017-01-15 [Steffen] BFCed
// 0 !HISTORY 2017-12-30 [PTadmin] Official Update 2017-01
// 
// 
// 2 24 1 0 0 0.9239 0 0.3827
  [2,24,1,0,0,0.9239,0,0.3827],
// 2 24 0.9239 0 0.3827 0.7071 0 0.7071
  [2,24,0.9239,0,0.3827,0.7071,0,0.7071],
// 2 24 0.7071 0 0.7071 0.3827 0 0.9239
  [2,24,0.7071,0,0.7071,0.3827,0,0.9239],
// 2 24 0.3827 0 0.9239 0 0 1
  [2,24,0.3827,0,0.9239,0,0,1],
// 2 24 0 0 1 -0.3827 0 0.9239
  [2,24,0,0,1,-0.3827,0,0.9239],
// 2 24 -0.3827 0 0.9239 -0.7071 0 0.7071
  [2,24,-0.3827,0,0.9239,-0.7071,0,0.7071],
// 2 24 -0.7071 0 0.7071 -0.9239 0 0.3827
  [2,24,-0.7071,0,0.7071,-0.9239,0,0.3827],
// 2 24 -0.9239 0 0.3827 -1 0 -0
  [2,24,-0.9239,0,0.3827,-1,0,-0],
// 2 24 -1 0 -0 -0.9239 0 -0.3827
  [2,24,-1,0,-0,-0.9239,0,-0.3827],
// 2 24 -0.9239 0 -0.3827 -0.7071 0 -0.7071
  [2,24,-0.9239,0,-0.3827,-0.7071,0,-0.7071],
// 2 24 -0.7071 0 -0.7071 -0.3827 0 -0.9239
  [2,24,-0.7071,0,-0.7071,-0.3827,0,-0.9239],
// 2 24 -0.3827 0 -0.9239 0 0 -1
  [2,24,-0.3827,0,-0.9239,0,0,-1],
// 2 24 0 0 -1 0.3827 0 -0.9239
  [2,24,0,0,-1,0.3827,0,-0.9239],
// 2 24 0.3827 0 -0.9239 0.7071 0 -0.7071
  [2,24,0.3827,0,-0.9239,0.7071,0,-0.7071],
// 2 24 0.7071 0 -0.7071 0.9239 0 -0.3827
  [2,24,0.7071,0,-0.7071,0.9239,0,-0.3827],
// 2 24 0.9239 0 -0.3827 1 0 0
  [2,24,0.9239,0,-0.3827,1,0,0],
];
module ldraw_lib__4_4edge(step=0, col=false, unit=2/5, alt=false, line=0.2, solid=!$preview)
    makepoly(ldraw_lib__4_4edge(), step=step, col=col, unit=unit, alt=alt, line=line, solid=solid);
ldraw_lib__4_4edge(line=0.2);
// file: ../p/4-4cylo.scad
use <../lib.scad>
use <4-4cyli.scad>
use <4-4edge.scad>
function ldraw_lib__4_4cylo() = [
// 0 Cylinder Open 1.0
// 0 Name: 4-4cylo.dat
// 0 Author: Mark Kennedy [mkennedy]
// 0 !LDRAW_ORG Primitive UPDATE 2010-01
// 0 !LICENSE Licensed under CC BY 4.0 : see CAreadme.txt
// 
// 0 BFC CERTIFY CCW
  [0,"BFC","CERTIFY"],
  [0,"BFC","CCW"],
// 
// 0 !HISTORY 2010-04-05 [PTadmin] Official Update 2010-01
// 
// 
// 1 16 0 0 0 1 0 0 0 1 0 0 0 1 4-4edge.dat
  [1,16,0,0,0,1,0,0,0,1,0,0,0,1, ldraw_lib__4_4edge()],
// 1 16 0 1 0 1 0 0 0 1 0 0 0 1 4-4edge.dat
  [1,16,0,1,0,1,0,0,0,1,0,0,0,1, ldraw_lib__4_4edge()],
// 1 16 0 0 0 1 0 0 0 1 0 0 0 1 4-4cyli.dat
  [1,16,0,0,0,1,0,0,0,1,0,0,0,1, ldraw_lib__4_4cyli()],
// 0
];
module ldraw_lib__4_4cylo(step=0, col=false, unit=2/5, alt=false, line=0.2, solid=!$preview)
    makepoly(ldraw_lib__4_4cylo(), step=step, col=col, unit=unit, alt=alt, line=line, solid=solid);
ldraw_lib__4_4cylo(line=0.2);
// file: ../p/4-4cyli.scad
use <../lib.scad>
function ldraw_lib__4_4cyli() = [
// 0 Cylinder 1.0
// 0 Name: 4-4cyli.dat
// 0 Author: James Jessiman
// 0 !LDRAW_ORG Primitive UPDATE 2005-01
// 0 !LICENSE Licensed under CC BY 2.0 and CC BY 4.0 : see CAreadme.txt
// 
// 0 BFC CERTIFY CCW
  [0,"BFC","CERTIFY"],
  [0,"BFC","CCW"],
// 
// 0 !HISTORY 1998-12-15 [PTadmin] Official Update 1998-10
// 0 !HISTORY 2002-03-23 [sbliss] Added BFC statement; merged headers from files in distributions LDraw 0.27 and Complete.
// 0 !HISTORY 2002-04-25 [PTadmin] Official Update 2002-02
// 0 !HISTORY 2004-12-14 [guyvivan] BFC CCW
// 0 !HISTORY 2005-12-28 [PTadmin] Official Update 2005-01
// 0 !HISTORY 2007-06-24 [PTadmin] Header formatted for Contributor Agreement
// 0 !HISTORY 2008-07-01 [PTadmin] Official Update 2008-01
// 
// 
// 4 16 1 1 0 0.9239 1 0.3827 0.9239 0 0.3827 1 0 0
  [4,16,1,1,0,0.9239,1,0.3827,0.9239,0,0.3827,1,0,0],
// 5 24 1 0 0 1 1 0 0.9239 0 0.3827 0.9239 0 -0.3827
  [5,24,1,0,0,1,1,0,0.9239,0,0.3827,0.9239,0,-0.3827],
// 4 16 0.9239 1 0.3827 0.7071 1 0.7071 0.7071 0 0.7071 0.9239 0 0.3827
  [4,16,0.9239,1,0.3827,0.7071,1,0.7071,0.7071,0,0.7071,0.9239,0,0.3827],
// 5 24 0.9239 0 0.3827 0.9239 1 0.3827 0.7071 0 0.7071 1 0 0
  [5,24,0.9239,0,0.3827,0.9239,1,0.3827,0.7071,0,0.7071,1,0,0],
// 4 16 0.7071 1 0.7071 0.3827 1 0.9239 0.3827 0 0.9239 0.7071 0 0.7071
  [4,16,0.7071,1,0.7071,0.3827,1,0.9239,0.3827,0,0.9239,0.7071,0,0.7071],
// 5 24 0.7071 0 0.7071 0.7071 1 0.7071 0.3827 0 0.9239 0.9239 0 0.3827
  [5,24,0.7071,0,0.7071,0.7071,1,0.7071,0.3827,0,0.9239,0.9239,0,0.3827],
// 4 16 0.3827 1 0.9239 0 1 1 0 0 1 0.3827 0 0.9239
  [4,16,0.3827,1,0.9239,0,1,1,0,0,1,0.3827,0,0.9239],
// 5 24 0.3827 0 0.9239 0.3827 1 0.9239 0 0 1 0.7071 0 0.7071
  [5,24,0.3827,0,0.9239,0.3827,1,0.9239,0,0,1,0.7071,0,0.7071],
// 4 16 0 1 1 -0.3827 1 0.9239 -0.3827 0 0.9239 0 0 1
  [4,16,0,1,1,-0.3827,1,0.9239,-0.3827,0,0.9239,0,0,1],
// 5 24 0 0 1 0 1 1 -0.3827 0 0.9239 0.3827 0 0.9239
  [5,24,0,0,1,0,1,1,-0.3827,0,0.9239,0.3827,0,0.9239],
// 4 16 -0.3827 1 0.9239 -0.7071 1 0.7071 -0.7071 0 0.7071 -0.3827 0 0.9239
  [4,16,-0.3827,1,0.9239,-0.7071,1,0.7071,-0.7071,0,0.7071,-0.3827,0,0.9239],
// 5 24 -0.3827 0 0.9239 -0.3827 1 0.9239 -0.7071 0 0.7071 0 0 1
  [5,24,-0.3827,0,0.9239,-0.3827,1,0.9239,-0.7071,0,0.7071,0,0,1],
// 4 16 -0.7071 1 0.7071 -0.9239 1 0.3827 -0.9239 0 0.3827 -0.7071 0 0.7071
  [4,16,-0.7071,1,0.7071,-0.9239,1,0.3827,-0.9239,0,0.3827,-0.7071,0,0.7071],
// 5 24 -0.7071 0 0.7071 -0.7071 1 0.7071 -0.9239 0 0.3827 -0.3827 0 0.9239
  [5,24,-0.7071,0,0.7071,-0.7071,1,0.7071,-0.9239,0,0.3827,-0.3827,0,0.9239],
// 4 16 -0.9239 1 0.3827 -1 1 0 -1 0 0 -0.9239 0 0.3827
  [4,16,-0.9239,1,0.3827,-1,1,0,-1,0,0,-0.9239,0,0.3827],
// 5 24 -0.9239 0 0.3827 -0.9239 1 0.3827 -1 0 0 -0.7071 0 0.7071
  [5,24,-0.9239,0,0.3827,-0.9239,1,0.3827,-1,0,0,-0.7071,0,0.7071],
// 4 16 -1 1 0 -0.9239 1 -0.3827 -0.9239 0 -0.3827 -1 0 0
  [4,16,-1,1,0,-0.9239,1,-0.3827,-0.9239,0,-0.3827,-1,0,0],
// 5 24 -1 0 0 -1 1 0 -0.9239 0 -0.3827 -0.9239 0 0.3827
  [5,24,-1,0,0,-1,1,0,-0.9239,0,-0.3827,-0.9239,0,0.3827],
// 4 16 -0.9239 1 -0.3827 -0.7071 1 -0.7071 -0.7071 0 -0.7071 -0.9239 0 -0.3827
  [4,16,-0.9239,1,-0.3827,-0.7071,1,-0.7071,-0.7071,0,-0.7071,-0.9239,0,-0.3827],
// 5 24 -0.9239 0 -0.3827 -0.9239 1 -0.3827 -0.7071 0 -0.7071 -1 0 0
  [5,24,-0.9239,0,-0.3827,-0.9239,1,-0.3827,-0.7071,0,-0.7071,-1,0,0],
// 4 16 -0.7071 1 -0.7071 -0.3827 1 -0.9239 -0.3827 0 -0.9239 -0.7071 0 -0.7071
  [4,16,-0.7071,1,-0.7071,-0.3827,1,-0.9239,-0.3827,0,-0.9239,-0.7071,0,-0.7071],
// 5 24 -0.7071 0 -0.7071 -0.7071 1 -0.7071 -0.3827 0 -0.9239 -0.9239 0 -0.3827
  [5,24,-0.7071,0,-0.7071,-0.7071,1,-0.7071,-0.3827,0,-0.9239,-0.9239,0,-0.3827],
// 4 16 -0.3827 1 -0.9239 0 1 -1 0 0 -1 -0.3827 0 -0.9239
  [4,16,-0.3827,1,-0.9239,0,1,-1,0,0,-1,-0.3827,0,-0.9239],
// 5 24 -0.3827 0 -0.9239 -0.3827 1 -0.9239 0 0 -1 -0.7071 0 -0.7071
  [5,24,-0.3827,0,-0.9239,-0.3827,1,-0.9239,0,0,-1,-0.7071,0,-0.7071],
// 4 16 0 1 -1 0.3827 1 -0.9239 0.3827 0 -0.9239 0 0 -1
  [4,16,0,1,-1,0.3827,1,-0.9239,0.3827,0,-0.9239,0,0,-1],
// 5 24 0 0 -1 0 1 -1 0.3827 0 -0.9239 -0.3827 0 -0.9239
  [5,24,0,0,-1,0,1,-1,0.3827,0,-0.9239,-0.3827,0,-0.9239],
// 4 16 0.3827 1 -0.9239 0.7071 1 -0.7071 0.7071 0 -0.7071 0.3827 0 -0.9239
  [4,16,0.3827,1,-0.9239,0.7071,1,-0.7071,0.7071,0,-0.7071,0.3827,0,-0.9239],
// 5 24 0.3827 0 -0.9239 0.3827 1 -0.9239 0.7071 0 -0.7071 0 0 -1
  [5,24,0.3827,0,-0.9239,0.3827,1,-0.9239,0.7071,0,-0.7071,0,0,-1],
// 4 16 0.7071 1 -0.7071 0.9239 1 -0.3827 0.9239 0 -0.3827 0.7071 0 -0.7071
  [4,16,0.7071,1,-0.7071,0.9239,1,-0.3827,0.9239,0,-0.3827,0.7071,0,-0.7071],
// 5 24 0.7071 0 -0.7071 0.7071 1 -0.7071 0.9239 0 -0.3827 0.3827 0 -0.9239
  [5,24,0.7071,0,-0.7071,0.7071,1,-0.7071,0.9239,0,-0.3827,0.3827,0,-0.9239],
// 4 16 0.9239 1 -0.3827 1 1 0 1 0 0 0.9239 0 -0.3827
  [4,16,0.9239,1,-0.3827,1,1,0,1,0,0,0.9239,0,-0.3827],
// 5 24 0.9239 0 -0.3827 0.9239 1 -0.3827 1 0 0 0.7071 0 -0.7071
  [5,24,0.9239,0,-0.3827,0.9239,1,-0.3827,1,0,0,0.7071,0,-0.7071],
// 0
];
module ldraw_lib__4_4cyli(step=0, col=false, unit=2/5, alt=false, line=0.2, solid=!$preview)
    makepoly(ldraw_lib__4_4cyli(), step=step, col=col, unit=unit, alt=alt, line=line, solid=solid);
ldraw_lib__4_4cyli(line=0.2);
// main file
use <../lib.scad>
use <../p/4-4cyli.scad>
use <../p/4-4cylo.scad>
use <../p/4-4edge.scad>
use <../p/4-4rin17.scad>
use <../p/4-4rin19.scad>
use <../p/4-4rin20.scad>
use <../p/4-4ring6.scad>
use <../p/4-8sphe.scad>
function ldraw_lib__30081() = [
// 0 ~Glass for Panel  4 x  3 x  3 with Porthole
// 0 Name: 30081.dat
// 0 Author: Magnus Forsberg [MagFors]
// 0 !LDRAW_ORG Part UPDATE 2011-02
// 0 !LICENSE Licensed under CC BY 4.0 : see CAreadme.txt
// 
// 0 BFC CERTIFY CCW
  [0,"BFC","CERTIFY"],
  [0,"BFC","CCW"],
// 
// 0 !HISTORY 2011-12-29 [PTadmin] Official Update 2011-02
// 
// 
// 1 16 0 0 0 17 0 0 0 1 0 0 0 17 4-4edge.dat
  [1,16,0,0,0,17,0,0,0,1,0,0,0,17, ldraw_lib__4_4edge()],
// 1 16 0 0 0 -1 0 0 0 -1 0 0 0 1 4-4rin17.dat
  [1,16,0,0,0,-1,0,0,0,-1,0,0,0,1, ldraw_lib__4_4rin17()],
// 1 16 0 0 0 -3 0 0 0 -1 0 0 0 3 4-4ring6.dat
  [1,16,0,0,0,-3,0,0,0,-1,0,0,0,3, ldraw_lib__4_4ring6()],
// 0 BFC INVERTNEXT
  [0,"BFC","INVERTNEXT"],
// 1 16 0 -8 0 17 0 0 0 8 0 0 0 17 4-4cyli.dat
  [1,16,0,-8,0,17,0,0,0,8,0,0,0,17, ldraw_lib__4_4cyli()],
// 0 BFC INVERTNEXT
  [0,"BFC","INVERTNEXT"],
// 1 16 0 -8 0 17 0 0 0 -1.5 0 0 0 -17 4-8sphe.dat
  [1,16,0,-8,0,17,0,0,0,-1.5,0,0,0,-17, ldraw_lib__4_8sphe()],
// 1 16 0 -8 0 19 0 0 0 4 0 0 0 19 4-4cyli.dat
  [1,16,0,-8,0,19,0,0,0,4,0,0,0,19, ldraw_lib__4_4cyli()],
// 1 16 0 -8 0 19 0 0 0 -3 0 0 0 -19 4-8sphe.dat
  [1,16,0,-8,0,19,0,0,0,-3,0,0,0,-19, ldraw_lib__4_8sphe()],
// 1 16 0 -4 0 19 0 0 0 1 0 0 0 19 4-4edge.dat
  [1,16,0,-4,0,19,0,0,0,1,0,0,0,19, ldraw_lib__4_4edge()],
// 1 16 0 -4 0 1 0 0 0 1 0 0 0 1 4-4rin19.dat
  [1,16,0,-4,0,1,0,0,0,1,0,0,0,1, ldraw_lib__4_4rin19()],
// 1 16 0 -4 0 1 0 0 0 1 0 0 0 1 4-4rin20.dat
  [1,16,0,-4,0,1,0,0,0,1,0,0,0,1, ldraw_lib__4_4rin20()],
// 1 16 0 -4 0 21 0 0 0 4 0 0 0 21 4-4cylo.dat
  [1,16,0,-4,0,21,0,0,0,4,0,0,0,21, ldraw_lib__4_4cylo()],
];
module ldraw_lib__30081(step=0, col=false, unit=2/5, alt=false, line=0.2, solid=!$preview)
    makepoly(ldraw_lib__30081(), step=step, col=col, unit=unit, alt=alt, line=line, solid=solid);
ldraw_lib__30081(line=0.2);
